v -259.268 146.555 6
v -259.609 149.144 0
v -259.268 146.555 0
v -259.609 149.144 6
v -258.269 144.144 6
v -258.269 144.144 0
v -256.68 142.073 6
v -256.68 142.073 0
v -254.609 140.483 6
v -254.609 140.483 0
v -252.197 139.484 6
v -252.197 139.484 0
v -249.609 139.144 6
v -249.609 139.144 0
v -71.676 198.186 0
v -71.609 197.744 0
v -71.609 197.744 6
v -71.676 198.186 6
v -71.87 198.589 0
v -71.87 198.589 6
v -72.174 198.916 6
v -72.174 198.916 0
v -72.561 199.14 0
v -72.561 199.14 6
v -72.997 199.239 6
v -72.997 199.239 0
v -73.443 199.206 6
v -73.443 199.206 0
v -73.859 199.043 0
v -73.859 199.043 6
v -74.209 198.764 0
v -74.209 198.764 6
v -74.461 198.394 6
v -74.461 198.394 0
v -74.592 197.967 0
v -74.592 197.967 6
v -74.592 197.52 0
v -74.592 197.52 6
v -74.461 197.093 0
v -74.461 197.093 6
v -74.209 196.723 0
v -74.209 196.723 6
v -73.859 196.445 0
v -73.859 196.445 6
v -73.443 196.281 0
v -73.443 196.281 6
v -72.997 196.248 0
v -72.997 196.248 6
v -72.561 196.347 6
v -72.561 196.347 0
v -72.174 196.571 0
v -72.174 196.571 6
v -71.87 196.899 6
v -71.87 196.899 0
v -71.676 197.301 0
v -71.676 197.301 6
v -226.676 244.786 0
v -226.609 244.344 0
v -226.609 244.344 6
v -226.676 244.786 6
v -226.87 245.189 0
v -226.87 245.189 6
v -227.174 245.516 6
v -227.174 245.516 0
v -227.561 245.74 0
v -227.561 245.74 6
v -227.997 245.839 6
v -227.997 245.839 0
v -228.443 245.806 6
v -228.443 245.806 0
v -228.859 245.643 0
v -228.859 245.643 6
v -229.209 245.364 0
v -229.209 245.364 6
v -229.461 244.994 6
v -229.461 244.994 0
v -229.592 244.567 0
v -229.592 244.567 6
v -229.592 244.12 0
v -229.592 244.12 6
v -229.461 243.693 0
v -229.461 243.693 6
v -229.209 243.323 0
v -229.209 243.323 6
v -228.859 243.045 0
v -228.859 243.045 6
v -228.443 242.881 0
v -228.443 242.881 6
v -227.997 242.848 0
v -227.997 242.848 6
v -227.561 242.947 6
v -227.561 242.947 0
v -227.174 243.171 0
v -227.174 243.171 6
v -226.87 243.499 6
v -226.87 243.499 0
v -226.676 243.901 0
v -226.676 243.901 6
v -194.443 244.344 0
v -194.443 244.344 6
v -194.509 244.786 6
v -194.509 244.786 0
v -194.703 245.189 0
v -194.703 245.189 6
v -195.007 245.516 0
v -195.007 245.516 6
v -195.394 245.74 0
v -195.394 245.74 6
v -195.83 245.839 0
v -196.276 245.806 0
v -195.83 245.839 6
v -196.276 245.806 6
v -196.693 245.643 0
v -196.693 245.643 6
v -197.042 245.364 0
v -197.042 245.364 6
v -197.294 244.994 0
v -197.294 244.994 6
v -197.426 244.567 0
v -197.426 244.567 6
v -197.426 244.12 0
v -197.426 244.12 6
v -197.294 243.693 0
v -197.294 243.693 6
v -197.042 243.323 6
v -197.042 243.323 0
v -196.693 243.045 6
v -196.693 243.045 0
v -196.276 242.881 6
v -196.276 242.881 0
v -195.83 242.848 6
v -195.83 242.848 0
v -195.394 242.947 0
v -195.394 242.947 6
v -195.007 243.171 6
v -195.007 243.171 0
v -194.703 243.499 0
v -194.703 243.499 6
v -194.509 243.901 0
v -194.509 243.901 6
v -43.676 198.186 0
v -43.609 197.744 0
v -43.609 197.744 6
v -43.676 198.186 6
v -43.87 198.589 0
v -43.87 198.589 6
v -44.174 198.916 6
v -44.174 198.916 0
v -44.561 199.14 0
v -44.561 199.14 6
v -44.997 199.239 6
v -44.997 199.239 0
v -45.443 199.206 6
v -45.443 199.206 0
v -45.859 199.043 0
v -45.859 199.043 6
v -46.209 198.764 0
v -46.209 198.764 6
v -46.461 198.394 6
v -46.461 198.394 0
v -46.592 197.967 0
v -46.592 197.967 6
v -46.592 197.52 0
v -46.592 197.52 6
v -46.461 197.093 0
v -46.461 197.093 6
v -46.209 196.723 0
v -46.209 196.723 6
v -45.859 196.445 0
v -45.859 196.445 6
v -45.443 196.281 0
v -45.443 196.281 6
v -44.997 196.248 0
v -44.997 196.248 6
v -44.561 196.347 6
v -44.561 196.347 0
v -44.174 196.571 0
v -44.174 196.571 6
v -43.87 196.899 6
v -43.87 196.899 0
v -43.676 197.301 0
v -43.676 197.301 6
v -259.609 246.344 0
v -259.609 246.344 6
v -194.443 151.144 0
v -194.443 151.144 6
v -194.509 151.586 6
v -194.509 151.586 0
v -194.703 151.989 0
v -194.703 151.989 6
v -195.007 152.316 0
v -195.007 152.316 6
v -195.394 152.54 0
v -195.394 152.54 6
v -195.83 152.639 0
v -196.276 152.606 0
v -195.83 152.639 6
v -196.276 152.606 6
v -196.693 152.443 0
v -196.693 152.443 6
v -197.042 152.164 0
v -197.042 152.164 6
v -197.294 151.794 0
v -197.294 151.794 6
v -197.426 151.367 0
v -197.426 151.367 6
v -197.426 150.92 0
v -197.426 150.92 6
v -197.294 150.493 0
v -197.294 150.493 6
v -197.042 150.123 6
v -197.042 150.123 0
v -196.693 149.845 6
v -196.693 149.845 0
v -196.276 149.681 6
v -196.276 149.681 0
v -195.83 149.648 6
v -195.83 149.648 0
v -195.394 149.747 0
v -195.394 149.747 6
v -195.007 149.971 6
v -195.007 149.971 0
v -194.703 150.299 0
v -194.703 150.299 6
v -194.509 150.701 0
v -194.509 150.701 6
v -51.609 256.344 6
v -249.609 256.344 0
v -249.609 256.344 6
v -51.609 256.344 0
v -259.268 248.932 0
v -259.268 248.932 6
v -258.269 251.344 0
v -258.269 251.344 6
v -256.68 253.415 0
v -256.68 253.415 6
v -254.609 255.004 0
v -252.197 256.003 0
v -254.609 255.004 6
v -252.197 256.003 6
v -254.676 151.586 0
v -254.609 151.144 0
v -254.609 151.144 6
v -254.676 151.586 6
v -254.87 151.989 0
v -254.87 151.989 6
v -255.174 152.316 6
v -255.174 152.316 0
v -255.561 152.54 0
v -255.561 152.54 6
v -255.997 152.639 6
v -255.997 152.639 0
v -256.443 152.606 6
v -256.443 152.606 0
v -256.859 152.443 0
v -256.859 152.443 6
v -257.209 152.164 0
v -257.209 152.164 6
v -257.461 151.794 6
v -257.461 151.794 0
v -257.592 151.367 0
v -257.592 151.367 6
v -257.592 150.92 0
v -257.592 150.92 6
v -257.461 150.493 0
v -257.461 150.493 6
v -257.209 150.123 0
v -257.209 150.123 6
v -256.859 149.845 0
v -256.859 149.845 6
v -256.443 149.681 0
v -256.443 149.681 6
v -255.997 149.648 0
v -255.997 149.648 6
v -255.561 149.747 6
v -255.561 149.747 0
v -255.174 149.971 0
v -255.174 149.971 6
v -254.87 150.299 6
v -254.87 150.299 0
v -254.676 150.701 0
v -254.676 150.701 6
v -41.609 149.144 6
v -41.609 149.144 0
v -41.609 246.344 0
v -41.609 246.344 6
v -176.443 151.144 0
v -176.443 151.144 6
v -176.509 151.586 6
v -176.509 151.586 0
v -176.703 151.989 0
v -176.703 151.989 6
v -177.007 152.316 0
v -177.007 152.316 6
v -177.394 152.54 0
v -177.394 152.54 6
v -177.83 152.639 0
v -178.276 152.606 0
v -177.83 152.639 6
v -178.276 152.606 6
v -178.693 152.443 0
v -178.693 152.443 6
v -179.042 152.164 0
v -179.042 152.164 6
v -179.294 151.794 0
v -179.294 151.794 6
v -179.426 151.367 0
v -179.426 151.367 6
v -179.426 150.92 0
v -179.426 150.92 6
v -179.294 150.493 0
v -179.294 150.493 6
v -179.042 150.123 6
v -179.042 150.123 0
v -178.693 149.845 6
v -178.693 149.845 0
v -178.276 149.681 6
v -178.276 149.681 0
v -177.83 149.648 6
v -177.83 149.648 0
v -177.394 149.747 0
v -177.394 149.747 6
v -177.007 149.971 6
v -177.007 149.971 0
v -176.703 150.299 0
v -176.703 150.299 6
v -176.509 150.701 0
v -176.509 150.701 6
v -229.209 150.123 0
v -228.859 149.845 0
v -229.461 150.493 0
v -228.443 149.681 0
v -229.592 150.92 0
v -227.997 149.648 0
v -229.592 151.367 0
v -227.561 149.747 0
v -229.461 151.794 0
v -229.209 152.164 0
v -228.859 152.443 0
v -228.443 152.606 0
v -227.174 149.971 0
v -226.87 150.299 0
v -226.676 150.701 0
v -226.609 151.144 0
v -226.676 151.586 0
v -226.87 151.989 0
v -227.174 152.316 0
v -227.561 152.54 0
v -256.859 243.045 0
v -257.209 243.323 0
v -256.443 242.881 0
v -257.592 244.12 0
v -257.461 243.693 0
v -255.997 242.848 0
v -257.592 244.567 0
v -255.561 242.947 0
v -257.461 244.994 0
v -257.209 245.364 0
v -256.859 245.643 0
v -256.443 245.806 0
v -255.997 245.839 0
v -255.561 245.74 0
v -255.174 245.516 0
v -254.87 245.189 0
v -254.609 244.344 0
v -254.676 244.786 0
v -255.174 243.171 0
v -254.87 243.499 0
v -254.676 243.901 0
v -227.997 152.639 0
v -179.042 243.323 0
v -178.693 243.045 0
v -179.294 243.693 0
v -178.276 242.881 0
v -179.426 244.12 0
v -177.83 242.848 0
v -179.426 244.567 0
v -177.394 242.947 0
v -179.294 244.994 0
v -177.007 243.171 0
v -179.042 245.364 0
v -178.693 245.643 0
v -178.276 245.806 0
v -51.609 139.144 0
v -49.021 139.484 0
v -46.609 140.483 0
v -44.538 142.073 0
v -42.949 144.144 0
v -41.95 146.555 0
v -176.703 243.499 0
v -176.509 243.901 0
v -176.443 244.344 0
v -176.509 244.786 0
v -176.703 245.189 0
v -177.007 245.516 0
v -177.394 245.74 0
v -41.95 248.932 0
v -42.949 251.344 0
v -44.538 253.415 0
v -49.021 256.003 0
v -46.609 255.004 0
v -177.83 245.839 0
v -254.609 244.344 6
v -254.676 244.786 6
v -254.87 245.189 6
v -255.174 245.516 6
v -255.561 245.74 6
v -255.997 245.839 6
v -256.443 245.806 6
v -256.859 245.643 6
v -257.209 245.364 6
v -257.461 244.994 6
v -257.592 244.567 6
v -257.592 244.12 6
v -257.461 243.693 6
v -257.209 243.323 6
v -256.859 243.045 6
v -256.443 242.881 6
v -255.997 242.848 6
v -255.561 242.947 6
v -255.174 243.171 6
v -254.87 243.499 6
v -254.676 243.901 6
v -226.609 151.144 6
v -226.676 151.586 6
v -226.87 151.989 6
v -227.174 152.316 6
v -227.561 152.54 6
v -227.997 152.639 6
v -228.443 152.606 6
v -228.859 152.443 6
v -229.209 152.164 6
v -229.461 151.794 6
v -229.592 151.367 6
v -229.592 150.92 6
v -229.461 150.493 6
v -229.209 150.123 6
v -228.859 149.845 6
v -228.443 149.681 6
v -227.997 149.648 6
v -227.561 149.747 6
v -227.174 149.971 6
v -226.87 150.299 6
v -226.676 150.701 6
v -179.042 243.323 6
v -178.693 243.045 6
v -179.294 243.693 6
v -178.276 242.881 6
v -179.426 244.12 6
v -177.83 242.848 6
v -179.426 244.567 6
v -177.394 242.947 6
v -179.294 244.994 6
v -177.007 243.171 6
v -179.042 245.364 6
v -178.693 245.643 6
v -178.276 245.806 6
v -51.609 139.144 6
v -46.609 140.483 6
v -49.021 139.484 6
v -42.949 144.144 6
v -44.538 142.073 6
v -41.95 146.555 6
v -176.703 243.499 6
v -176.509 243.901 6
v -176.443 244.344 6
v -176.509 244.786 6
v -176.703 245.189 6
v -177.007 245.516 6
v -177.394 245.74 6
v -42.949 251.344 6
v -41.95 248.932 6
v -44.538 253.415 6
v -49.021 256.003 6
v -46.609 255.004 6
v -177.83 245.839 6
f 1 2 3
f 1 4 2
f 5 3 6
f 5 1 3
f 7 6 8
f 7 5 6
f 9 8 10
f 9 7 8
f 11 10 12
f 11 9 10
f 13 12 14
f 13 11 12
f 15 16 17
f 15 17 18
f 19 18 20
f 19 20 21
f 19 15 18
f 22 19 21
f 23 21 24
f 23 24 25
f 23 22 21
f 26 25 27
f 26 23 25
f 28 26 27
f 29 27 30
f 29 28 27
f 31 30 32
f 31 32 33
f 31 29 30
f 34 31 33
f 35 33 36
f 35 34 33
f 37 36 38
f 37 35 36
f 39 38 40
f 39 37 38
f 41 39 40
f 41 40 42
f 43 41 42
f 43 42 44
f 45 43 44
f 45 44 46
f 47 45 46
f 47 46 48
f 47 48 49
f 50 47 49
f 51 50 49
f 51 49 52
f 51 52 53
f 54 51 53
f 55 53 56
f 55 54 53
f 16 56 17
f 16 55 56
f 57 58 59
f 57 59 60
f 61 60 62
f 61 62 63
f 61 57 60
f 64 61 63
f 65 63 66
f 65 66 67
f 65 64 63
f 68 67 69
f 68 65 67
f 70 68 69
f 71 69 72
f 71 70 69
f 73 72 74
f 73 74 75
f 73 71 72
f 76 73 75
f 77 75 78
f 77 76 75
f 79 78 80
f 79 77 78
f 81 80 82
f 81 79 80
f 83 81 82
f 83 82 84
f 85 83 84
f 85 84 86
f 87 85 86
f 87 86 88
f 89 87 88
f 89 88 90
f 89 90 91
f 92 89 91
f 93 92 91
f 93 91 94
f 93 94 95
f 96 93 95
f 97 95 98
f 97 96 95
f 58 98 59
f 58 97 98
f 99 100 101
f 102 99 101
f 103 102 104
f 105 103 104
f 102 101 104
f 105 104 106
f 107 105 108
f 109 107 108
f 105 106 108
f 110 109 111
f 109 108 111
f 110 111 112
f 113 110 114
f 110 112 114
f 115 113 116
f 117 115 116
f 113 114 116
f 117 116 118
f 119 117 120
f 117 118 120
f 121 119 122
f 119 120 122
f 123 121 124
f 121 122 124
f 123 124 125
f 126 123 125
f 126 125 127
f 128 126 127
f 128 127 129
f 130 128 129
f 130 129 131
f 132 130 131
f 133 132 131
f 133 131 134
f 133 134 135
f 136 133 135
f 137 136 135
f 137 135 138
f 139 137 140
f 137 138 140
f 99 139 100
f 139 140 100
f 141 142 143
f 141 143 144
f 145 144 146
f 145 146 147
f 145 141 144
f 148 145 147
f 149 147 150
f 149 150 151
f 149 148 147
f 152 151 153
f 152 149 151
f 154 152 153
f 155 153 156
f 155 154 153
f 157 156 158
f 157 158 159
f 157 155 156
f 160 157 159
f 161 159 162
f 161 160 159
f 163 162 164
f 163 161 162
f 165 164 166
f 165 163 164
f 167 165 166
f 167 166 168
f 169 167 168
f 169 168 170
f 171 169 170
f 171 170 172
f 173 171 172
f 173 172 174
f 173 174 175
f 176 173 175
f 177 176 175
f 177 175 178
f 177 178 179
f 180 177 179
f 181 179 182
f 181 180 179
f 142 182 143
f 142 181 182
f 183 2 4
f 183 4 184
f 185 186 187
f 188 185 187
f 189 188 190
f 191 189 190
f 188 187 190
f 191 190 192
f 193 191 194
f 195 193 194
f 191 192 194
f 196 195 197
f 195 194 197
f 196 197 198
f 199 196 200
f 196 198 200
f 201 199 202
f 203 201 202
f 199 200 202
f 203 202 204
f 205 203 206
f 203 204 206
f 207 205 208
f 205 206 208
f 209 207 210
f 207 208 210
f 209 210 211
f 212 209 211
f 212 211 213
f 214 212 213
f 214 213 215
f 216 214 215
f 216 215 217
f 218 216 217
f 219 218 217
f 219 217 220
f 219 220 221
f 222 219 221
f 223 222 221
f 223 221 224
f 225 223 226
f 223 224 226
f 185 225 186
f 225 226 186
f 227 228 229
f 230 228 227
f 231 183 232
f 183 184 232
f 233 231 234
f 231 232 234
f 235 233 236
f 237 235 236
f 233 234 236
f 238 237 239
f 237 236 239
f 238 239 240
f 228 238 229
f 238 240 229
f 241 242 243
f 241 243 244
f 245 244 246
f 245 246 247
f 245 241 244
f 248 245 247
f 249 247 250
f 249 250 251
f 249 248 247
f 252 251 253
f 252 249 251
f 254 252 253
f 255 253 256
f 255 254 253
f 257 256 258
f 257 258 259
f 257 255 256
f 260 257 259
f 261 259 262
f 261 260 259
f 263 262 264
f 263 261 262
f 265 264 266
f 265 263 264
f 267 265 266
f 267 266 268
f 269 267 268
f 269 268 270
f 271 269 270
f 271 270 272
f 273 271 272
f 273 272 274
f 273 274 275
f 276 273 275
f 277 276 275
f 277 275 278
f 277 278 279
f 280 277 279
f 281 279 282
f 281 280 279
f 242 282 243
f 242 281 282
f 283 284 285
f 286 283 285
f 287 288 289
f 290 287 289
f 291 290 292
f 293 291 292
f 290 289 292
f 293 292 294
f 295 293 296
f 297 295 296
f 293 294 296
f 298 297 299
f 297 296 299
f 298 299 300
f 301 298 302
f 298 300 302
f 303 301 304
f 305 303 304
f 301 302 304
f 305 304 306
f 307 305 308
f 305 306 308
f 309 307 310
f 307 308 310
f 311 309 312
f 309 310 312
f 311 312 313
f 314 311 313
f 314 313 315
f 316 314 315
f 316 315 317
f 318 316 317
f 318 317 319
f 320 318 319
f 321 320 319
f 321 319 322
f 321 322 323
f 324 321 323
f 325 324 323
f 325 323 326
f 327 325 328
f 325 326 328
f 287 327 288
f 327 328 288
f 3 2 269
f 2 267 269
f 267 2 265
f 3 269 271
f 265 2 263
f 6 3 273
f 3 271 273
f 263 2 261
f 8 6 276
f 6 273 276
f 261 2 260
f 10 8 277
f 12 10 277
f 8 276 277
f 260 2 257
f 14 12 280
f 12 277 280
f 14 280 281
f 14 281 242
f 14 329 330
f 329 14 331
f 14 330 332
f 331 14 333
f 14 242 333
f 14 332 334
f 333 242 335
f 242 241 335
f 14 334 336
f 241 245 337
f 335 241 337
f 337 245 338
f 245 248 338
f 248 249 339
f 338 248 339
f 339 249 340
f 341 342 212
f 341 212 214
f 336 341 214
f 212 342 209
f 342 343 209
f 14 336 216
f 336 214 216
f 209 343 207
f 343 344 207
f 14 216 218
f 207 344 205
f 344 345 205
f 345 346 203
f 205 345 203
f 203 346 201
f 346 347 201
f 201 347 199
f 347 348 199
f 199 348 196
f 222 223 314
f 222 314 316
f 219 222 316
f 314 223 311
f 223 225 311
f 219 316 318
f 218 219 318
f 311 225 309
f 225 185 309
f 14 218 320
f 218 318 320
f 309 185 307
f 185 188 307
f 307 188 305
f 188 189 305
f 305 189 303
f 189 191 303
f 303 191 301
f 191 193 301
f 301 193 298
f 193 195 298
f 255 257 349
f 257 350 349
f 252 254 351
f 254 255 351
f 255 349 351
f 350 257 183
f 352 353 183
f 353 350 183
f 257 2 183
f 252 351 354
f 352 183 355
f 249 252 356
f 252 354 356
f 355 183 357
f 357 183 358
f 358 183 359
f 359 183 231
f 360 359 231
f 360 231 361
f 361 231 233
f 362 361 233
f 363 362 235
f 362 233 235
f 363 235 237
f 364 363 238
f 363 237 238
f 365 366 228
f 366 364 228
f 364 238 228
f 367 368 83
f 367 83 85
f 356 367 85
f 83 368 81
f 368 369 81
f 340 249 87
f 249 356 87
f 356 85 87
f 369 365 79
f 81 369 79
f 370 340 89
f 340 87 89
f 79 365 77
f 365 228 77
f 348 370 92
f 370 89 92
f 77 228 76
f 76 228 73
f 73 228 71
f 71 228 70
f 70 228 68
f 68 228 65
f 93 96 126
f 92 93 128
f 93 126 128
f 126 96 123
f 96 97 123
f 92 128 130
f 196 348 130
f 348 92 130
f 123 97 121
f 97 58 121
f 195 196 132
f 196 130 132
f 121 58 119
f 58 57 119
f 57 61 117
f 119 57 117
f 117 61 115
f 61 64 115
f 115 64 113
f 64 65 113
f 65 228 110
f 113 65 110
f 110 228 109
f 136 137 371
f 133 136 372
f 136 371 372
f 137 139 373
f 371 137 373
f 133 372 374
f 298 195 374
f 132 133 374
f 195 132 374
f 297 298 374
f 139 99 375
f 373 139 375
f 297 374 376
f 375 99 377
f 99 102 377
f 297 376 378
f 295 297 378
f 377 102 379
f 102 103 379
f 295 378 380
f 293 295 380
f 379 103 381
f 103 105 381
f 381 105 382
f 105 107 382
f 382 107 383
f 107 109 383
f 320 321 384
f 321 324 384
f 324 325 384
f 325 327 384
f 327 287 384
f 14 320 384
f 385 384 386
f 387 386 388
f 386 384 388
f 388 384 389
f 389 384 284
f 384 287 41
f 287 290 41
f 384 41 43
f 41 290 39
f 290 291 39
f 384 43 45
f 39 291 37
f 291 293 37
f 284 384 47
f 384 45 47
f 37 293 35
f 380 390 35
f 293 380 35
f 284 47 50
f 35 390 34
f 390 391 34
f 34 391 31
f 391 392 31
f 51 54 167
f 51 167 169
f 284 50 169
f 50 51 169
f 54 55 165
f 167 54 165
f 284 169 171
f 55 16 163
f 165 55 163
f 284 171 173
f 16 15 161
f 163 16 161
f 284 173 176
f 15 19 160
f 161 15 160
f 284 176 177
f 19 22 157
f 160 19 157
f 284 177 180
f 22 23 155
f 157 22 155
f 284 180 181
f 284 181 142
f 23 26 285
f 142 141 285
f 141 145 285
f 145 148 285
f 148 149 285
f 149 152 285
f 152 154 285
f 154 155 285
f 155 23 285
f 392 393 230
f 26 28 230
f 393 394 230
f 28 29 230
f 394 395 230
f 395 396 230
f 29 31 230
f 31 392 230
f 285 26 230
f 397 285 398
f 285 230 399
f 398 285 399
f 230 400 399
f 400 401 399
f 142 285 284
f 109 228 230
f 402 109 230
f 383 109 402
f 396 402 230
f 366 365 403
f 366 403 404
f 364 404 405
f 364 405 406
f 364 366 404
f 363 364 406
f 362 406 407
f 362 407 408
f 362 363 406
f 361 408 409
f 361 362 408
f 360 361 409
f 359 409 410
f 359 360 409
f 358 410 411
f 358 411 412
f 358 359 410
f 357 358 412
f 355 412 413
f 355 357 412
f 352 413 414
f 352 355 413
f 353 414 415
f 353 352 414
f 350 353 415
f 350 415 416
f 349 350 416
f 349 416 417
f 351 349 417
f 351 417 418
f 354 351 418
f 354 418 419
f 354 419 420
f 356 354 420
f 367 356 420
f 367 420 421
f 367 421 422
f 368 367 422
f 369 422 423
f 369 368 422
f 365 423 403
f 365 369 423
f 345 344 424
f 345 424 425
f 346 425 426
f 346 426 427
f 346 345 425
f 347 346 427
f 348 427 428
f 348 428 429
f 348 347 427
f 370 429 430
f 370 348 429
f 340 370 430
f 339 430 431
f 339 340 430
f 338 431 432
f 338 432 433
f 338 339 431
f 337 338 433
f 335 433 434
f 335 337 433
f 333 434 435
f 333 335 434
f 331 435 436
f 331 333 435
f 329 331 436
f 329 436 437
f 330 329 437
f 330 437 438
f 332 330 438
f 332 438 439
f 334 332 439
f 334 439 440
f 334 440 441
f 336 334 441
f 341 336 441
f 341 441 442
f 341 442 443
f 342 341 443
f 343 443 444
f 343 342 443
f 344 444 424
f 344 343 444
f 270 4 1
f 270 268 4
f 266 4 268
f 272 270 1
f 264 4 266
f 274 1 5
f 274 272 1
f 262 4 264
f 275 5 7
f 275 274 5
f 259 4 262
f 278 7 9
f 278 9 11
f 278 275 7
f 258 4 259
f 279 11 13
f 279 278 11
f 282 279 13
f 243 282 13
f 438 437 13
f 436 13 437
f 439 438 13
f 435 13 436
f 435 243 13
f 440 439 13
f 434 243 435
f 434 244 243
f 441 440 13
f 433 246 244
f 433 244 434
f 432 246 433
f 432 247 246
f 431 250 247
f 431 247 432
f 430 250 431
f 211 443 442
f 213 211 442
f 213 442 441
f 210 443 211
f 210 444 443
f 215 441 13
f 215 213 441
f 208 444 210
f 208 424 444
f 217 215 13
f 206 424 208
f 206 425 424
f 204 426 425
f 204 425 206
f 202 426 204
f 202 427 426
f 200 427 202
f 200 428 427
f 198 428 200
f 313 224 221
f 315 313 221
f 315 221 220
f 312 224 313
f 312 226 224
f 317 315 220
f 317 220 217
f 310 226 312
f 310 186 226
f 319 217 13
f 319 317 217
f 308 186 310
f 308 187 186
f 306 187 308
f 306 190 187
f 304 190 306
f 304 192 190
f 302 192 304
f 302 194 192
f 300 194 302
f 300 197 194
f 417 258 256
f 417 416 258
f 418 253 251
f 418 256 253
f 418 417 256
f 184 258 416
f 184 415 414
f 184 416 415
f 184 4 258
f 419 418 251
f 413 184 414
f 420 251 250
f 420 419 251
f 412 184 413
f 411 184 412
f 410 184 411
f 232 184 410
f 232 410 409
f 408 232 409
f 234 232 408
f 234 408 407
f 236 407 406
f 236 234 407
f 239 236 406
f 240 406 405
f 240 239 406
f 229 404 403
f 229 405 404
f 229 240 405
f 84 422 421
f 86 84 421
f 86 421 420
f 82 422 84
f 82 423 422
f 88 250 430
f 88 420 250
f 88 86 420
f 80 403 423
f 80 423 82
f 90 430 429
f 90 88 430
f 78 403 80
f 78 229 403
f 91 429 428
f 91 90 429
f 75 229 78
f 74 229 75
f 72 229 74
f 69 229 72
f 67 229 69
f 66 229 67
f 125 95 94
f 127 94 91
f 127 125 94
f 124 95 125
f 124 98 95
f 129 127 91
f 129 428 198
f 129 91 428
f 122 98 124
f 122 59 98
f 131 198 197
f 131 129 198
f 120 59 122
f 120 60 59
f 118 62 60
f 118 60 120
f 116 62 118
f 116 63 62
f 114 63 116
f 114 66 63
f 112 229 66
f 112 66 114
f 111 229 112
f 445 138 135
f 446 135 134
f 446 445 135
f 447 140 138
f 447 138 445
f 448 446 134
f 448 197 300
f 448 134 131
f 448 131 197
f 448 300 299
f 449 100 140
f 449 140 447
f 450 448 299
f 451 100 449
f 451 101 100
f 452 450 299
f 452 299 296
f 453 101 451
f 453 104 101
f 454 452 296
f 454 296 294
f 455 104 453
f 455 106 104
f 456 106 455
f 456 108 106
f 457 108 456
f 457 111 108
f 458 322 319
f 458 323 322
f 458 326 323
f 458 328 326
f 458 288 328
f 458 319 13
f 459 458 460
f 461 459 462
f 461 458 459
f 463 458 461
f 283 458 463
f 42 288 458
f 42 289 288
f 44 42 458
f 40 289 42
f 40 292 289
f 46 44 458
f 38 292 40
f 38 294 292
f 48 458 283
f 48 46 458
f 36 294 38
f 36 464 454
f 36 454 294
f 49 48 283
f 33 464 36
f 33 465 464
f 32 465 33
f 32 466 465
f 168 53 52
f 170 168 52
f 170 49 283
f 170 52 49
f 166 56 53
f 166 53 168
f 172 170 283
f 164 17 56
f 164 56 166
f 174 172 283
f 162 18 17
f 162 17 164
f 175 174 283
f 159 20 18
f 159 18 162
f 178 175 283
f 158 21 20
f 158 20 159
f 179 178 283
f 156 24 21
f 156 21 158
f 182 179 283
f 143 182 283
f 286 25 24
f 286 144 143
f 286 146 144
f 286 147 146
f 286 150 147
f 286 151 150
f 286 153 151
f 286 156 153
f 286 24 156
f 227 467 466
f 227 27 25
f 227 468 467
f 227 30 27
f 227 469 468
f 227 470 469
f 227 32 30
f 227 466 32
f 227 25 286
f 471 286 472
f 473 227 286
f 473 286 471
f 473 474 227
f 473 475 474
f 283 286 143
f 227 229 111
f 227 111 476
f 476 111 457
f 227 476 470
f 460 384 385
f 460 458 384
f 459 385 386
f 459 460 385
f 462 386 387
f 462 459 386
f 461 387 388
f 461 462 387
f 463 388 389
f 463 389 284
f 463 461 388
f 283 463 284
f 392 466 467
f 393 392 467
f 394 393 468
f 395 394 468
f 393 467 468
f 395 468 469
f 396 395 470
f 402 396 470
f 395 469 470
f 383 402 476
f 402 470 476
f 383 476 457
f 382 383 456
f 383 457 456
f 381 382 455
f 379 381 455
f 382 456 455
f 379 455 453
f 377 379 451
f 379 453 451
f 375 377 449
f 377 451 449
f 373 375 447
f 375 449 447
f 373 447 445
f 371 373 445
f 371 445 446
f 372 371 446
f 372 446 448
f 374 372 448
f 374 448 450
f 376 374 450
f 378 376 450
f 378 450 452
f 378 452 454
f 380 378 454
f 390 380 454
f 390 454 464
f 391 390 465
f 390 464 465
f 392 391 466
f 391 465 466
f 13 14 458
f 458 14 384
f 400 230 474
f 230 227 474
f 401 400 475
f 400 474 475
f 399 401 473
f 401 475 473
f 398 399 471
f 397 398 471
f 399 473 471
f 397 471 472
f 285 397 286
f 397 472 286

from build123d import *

# Parameters (mm, degrees)
SKETCH1_W           = 218
SKETCH1_H           = 117.2
SKETCH1_R           = 1.5
BOSS_EXTRUDE1_DEPTH = 6
SKETCH2_R           = 1.5
CUT_EXTRUDE1_DEPTH  = 6
FILLET1_R           = 10


with BuildPart() as part:
    # Sketch1 → Boss-Extrude1 (new body)
    with BuildSketch(Plane.XY):
        with Locations((-150.609177744, 197.743600407)):
            Rectangle(SKETCH1_W, SKETCH1_H)
        with Locations((-256.109177744, 244.343600407)):
            Circle(SKETCH1_R, mode=Mode.SUBTRACT)
        with Locations((-256.109177744, 151.143600407)):
            Circle(SKETCH1_R, mode=Mode.SUBTRACT)
        with Locations((-45.109177744, 197.743600407)):
            Circle(SKETCH1_R, mode=Mode.SUBTRACT)
        with Locations((-73.109177744, 197.743600407)):
            Circle(SKETCH1_R, mode=Mode.SUBTRACT)
        with Locations((-228.109177744, 244.343600407)):
            Circle(SKETCH1_R, mode=Mode.SUBTRACT)
        with Locations((-228.109177744, 151.143600407)):
            Circle(SKETCH1_R, mode=Mode.SUBTRACT)
    extrude(amount=BOSS_EXTRUDE1_DEPTH)

    # Sketch2 → Cut-Extrude1 (cut)
    with BuildSketch(Plane.XY.offset(6)):
        with Locations((-195.942511077, 151.143600407)):
            Circle(SKETCH2_R)
        with Locations((-177.942511077, 151.143600407)):
            Circle(SKETCH2_R)
        with Locations((-195.942511077, 244.343600407)):
            Circle(SKETCH2_R)
        with Locations((-177.942511077, 244.343600407)):
            Circle(SKETCH2_R)
    extrude(amount=-CUT_EXTRUDE1_DEPTH, mode=Mode.SUBTRACT)

    # Fillet1
    fillet1_edges = [part.edges().sort_by_distance(p)[0] for p in [
        (-259.609177744, 256.343600407, 3),
        (-41.609177744, 256.343600407, 3),
        (-41.609177744, 139.143600407, 3),
        (-259.609177744, 139.143600407, 3),
    ]]
    fillet(fillet1_edges, radius=FILLET1_R)


solid = part.part
